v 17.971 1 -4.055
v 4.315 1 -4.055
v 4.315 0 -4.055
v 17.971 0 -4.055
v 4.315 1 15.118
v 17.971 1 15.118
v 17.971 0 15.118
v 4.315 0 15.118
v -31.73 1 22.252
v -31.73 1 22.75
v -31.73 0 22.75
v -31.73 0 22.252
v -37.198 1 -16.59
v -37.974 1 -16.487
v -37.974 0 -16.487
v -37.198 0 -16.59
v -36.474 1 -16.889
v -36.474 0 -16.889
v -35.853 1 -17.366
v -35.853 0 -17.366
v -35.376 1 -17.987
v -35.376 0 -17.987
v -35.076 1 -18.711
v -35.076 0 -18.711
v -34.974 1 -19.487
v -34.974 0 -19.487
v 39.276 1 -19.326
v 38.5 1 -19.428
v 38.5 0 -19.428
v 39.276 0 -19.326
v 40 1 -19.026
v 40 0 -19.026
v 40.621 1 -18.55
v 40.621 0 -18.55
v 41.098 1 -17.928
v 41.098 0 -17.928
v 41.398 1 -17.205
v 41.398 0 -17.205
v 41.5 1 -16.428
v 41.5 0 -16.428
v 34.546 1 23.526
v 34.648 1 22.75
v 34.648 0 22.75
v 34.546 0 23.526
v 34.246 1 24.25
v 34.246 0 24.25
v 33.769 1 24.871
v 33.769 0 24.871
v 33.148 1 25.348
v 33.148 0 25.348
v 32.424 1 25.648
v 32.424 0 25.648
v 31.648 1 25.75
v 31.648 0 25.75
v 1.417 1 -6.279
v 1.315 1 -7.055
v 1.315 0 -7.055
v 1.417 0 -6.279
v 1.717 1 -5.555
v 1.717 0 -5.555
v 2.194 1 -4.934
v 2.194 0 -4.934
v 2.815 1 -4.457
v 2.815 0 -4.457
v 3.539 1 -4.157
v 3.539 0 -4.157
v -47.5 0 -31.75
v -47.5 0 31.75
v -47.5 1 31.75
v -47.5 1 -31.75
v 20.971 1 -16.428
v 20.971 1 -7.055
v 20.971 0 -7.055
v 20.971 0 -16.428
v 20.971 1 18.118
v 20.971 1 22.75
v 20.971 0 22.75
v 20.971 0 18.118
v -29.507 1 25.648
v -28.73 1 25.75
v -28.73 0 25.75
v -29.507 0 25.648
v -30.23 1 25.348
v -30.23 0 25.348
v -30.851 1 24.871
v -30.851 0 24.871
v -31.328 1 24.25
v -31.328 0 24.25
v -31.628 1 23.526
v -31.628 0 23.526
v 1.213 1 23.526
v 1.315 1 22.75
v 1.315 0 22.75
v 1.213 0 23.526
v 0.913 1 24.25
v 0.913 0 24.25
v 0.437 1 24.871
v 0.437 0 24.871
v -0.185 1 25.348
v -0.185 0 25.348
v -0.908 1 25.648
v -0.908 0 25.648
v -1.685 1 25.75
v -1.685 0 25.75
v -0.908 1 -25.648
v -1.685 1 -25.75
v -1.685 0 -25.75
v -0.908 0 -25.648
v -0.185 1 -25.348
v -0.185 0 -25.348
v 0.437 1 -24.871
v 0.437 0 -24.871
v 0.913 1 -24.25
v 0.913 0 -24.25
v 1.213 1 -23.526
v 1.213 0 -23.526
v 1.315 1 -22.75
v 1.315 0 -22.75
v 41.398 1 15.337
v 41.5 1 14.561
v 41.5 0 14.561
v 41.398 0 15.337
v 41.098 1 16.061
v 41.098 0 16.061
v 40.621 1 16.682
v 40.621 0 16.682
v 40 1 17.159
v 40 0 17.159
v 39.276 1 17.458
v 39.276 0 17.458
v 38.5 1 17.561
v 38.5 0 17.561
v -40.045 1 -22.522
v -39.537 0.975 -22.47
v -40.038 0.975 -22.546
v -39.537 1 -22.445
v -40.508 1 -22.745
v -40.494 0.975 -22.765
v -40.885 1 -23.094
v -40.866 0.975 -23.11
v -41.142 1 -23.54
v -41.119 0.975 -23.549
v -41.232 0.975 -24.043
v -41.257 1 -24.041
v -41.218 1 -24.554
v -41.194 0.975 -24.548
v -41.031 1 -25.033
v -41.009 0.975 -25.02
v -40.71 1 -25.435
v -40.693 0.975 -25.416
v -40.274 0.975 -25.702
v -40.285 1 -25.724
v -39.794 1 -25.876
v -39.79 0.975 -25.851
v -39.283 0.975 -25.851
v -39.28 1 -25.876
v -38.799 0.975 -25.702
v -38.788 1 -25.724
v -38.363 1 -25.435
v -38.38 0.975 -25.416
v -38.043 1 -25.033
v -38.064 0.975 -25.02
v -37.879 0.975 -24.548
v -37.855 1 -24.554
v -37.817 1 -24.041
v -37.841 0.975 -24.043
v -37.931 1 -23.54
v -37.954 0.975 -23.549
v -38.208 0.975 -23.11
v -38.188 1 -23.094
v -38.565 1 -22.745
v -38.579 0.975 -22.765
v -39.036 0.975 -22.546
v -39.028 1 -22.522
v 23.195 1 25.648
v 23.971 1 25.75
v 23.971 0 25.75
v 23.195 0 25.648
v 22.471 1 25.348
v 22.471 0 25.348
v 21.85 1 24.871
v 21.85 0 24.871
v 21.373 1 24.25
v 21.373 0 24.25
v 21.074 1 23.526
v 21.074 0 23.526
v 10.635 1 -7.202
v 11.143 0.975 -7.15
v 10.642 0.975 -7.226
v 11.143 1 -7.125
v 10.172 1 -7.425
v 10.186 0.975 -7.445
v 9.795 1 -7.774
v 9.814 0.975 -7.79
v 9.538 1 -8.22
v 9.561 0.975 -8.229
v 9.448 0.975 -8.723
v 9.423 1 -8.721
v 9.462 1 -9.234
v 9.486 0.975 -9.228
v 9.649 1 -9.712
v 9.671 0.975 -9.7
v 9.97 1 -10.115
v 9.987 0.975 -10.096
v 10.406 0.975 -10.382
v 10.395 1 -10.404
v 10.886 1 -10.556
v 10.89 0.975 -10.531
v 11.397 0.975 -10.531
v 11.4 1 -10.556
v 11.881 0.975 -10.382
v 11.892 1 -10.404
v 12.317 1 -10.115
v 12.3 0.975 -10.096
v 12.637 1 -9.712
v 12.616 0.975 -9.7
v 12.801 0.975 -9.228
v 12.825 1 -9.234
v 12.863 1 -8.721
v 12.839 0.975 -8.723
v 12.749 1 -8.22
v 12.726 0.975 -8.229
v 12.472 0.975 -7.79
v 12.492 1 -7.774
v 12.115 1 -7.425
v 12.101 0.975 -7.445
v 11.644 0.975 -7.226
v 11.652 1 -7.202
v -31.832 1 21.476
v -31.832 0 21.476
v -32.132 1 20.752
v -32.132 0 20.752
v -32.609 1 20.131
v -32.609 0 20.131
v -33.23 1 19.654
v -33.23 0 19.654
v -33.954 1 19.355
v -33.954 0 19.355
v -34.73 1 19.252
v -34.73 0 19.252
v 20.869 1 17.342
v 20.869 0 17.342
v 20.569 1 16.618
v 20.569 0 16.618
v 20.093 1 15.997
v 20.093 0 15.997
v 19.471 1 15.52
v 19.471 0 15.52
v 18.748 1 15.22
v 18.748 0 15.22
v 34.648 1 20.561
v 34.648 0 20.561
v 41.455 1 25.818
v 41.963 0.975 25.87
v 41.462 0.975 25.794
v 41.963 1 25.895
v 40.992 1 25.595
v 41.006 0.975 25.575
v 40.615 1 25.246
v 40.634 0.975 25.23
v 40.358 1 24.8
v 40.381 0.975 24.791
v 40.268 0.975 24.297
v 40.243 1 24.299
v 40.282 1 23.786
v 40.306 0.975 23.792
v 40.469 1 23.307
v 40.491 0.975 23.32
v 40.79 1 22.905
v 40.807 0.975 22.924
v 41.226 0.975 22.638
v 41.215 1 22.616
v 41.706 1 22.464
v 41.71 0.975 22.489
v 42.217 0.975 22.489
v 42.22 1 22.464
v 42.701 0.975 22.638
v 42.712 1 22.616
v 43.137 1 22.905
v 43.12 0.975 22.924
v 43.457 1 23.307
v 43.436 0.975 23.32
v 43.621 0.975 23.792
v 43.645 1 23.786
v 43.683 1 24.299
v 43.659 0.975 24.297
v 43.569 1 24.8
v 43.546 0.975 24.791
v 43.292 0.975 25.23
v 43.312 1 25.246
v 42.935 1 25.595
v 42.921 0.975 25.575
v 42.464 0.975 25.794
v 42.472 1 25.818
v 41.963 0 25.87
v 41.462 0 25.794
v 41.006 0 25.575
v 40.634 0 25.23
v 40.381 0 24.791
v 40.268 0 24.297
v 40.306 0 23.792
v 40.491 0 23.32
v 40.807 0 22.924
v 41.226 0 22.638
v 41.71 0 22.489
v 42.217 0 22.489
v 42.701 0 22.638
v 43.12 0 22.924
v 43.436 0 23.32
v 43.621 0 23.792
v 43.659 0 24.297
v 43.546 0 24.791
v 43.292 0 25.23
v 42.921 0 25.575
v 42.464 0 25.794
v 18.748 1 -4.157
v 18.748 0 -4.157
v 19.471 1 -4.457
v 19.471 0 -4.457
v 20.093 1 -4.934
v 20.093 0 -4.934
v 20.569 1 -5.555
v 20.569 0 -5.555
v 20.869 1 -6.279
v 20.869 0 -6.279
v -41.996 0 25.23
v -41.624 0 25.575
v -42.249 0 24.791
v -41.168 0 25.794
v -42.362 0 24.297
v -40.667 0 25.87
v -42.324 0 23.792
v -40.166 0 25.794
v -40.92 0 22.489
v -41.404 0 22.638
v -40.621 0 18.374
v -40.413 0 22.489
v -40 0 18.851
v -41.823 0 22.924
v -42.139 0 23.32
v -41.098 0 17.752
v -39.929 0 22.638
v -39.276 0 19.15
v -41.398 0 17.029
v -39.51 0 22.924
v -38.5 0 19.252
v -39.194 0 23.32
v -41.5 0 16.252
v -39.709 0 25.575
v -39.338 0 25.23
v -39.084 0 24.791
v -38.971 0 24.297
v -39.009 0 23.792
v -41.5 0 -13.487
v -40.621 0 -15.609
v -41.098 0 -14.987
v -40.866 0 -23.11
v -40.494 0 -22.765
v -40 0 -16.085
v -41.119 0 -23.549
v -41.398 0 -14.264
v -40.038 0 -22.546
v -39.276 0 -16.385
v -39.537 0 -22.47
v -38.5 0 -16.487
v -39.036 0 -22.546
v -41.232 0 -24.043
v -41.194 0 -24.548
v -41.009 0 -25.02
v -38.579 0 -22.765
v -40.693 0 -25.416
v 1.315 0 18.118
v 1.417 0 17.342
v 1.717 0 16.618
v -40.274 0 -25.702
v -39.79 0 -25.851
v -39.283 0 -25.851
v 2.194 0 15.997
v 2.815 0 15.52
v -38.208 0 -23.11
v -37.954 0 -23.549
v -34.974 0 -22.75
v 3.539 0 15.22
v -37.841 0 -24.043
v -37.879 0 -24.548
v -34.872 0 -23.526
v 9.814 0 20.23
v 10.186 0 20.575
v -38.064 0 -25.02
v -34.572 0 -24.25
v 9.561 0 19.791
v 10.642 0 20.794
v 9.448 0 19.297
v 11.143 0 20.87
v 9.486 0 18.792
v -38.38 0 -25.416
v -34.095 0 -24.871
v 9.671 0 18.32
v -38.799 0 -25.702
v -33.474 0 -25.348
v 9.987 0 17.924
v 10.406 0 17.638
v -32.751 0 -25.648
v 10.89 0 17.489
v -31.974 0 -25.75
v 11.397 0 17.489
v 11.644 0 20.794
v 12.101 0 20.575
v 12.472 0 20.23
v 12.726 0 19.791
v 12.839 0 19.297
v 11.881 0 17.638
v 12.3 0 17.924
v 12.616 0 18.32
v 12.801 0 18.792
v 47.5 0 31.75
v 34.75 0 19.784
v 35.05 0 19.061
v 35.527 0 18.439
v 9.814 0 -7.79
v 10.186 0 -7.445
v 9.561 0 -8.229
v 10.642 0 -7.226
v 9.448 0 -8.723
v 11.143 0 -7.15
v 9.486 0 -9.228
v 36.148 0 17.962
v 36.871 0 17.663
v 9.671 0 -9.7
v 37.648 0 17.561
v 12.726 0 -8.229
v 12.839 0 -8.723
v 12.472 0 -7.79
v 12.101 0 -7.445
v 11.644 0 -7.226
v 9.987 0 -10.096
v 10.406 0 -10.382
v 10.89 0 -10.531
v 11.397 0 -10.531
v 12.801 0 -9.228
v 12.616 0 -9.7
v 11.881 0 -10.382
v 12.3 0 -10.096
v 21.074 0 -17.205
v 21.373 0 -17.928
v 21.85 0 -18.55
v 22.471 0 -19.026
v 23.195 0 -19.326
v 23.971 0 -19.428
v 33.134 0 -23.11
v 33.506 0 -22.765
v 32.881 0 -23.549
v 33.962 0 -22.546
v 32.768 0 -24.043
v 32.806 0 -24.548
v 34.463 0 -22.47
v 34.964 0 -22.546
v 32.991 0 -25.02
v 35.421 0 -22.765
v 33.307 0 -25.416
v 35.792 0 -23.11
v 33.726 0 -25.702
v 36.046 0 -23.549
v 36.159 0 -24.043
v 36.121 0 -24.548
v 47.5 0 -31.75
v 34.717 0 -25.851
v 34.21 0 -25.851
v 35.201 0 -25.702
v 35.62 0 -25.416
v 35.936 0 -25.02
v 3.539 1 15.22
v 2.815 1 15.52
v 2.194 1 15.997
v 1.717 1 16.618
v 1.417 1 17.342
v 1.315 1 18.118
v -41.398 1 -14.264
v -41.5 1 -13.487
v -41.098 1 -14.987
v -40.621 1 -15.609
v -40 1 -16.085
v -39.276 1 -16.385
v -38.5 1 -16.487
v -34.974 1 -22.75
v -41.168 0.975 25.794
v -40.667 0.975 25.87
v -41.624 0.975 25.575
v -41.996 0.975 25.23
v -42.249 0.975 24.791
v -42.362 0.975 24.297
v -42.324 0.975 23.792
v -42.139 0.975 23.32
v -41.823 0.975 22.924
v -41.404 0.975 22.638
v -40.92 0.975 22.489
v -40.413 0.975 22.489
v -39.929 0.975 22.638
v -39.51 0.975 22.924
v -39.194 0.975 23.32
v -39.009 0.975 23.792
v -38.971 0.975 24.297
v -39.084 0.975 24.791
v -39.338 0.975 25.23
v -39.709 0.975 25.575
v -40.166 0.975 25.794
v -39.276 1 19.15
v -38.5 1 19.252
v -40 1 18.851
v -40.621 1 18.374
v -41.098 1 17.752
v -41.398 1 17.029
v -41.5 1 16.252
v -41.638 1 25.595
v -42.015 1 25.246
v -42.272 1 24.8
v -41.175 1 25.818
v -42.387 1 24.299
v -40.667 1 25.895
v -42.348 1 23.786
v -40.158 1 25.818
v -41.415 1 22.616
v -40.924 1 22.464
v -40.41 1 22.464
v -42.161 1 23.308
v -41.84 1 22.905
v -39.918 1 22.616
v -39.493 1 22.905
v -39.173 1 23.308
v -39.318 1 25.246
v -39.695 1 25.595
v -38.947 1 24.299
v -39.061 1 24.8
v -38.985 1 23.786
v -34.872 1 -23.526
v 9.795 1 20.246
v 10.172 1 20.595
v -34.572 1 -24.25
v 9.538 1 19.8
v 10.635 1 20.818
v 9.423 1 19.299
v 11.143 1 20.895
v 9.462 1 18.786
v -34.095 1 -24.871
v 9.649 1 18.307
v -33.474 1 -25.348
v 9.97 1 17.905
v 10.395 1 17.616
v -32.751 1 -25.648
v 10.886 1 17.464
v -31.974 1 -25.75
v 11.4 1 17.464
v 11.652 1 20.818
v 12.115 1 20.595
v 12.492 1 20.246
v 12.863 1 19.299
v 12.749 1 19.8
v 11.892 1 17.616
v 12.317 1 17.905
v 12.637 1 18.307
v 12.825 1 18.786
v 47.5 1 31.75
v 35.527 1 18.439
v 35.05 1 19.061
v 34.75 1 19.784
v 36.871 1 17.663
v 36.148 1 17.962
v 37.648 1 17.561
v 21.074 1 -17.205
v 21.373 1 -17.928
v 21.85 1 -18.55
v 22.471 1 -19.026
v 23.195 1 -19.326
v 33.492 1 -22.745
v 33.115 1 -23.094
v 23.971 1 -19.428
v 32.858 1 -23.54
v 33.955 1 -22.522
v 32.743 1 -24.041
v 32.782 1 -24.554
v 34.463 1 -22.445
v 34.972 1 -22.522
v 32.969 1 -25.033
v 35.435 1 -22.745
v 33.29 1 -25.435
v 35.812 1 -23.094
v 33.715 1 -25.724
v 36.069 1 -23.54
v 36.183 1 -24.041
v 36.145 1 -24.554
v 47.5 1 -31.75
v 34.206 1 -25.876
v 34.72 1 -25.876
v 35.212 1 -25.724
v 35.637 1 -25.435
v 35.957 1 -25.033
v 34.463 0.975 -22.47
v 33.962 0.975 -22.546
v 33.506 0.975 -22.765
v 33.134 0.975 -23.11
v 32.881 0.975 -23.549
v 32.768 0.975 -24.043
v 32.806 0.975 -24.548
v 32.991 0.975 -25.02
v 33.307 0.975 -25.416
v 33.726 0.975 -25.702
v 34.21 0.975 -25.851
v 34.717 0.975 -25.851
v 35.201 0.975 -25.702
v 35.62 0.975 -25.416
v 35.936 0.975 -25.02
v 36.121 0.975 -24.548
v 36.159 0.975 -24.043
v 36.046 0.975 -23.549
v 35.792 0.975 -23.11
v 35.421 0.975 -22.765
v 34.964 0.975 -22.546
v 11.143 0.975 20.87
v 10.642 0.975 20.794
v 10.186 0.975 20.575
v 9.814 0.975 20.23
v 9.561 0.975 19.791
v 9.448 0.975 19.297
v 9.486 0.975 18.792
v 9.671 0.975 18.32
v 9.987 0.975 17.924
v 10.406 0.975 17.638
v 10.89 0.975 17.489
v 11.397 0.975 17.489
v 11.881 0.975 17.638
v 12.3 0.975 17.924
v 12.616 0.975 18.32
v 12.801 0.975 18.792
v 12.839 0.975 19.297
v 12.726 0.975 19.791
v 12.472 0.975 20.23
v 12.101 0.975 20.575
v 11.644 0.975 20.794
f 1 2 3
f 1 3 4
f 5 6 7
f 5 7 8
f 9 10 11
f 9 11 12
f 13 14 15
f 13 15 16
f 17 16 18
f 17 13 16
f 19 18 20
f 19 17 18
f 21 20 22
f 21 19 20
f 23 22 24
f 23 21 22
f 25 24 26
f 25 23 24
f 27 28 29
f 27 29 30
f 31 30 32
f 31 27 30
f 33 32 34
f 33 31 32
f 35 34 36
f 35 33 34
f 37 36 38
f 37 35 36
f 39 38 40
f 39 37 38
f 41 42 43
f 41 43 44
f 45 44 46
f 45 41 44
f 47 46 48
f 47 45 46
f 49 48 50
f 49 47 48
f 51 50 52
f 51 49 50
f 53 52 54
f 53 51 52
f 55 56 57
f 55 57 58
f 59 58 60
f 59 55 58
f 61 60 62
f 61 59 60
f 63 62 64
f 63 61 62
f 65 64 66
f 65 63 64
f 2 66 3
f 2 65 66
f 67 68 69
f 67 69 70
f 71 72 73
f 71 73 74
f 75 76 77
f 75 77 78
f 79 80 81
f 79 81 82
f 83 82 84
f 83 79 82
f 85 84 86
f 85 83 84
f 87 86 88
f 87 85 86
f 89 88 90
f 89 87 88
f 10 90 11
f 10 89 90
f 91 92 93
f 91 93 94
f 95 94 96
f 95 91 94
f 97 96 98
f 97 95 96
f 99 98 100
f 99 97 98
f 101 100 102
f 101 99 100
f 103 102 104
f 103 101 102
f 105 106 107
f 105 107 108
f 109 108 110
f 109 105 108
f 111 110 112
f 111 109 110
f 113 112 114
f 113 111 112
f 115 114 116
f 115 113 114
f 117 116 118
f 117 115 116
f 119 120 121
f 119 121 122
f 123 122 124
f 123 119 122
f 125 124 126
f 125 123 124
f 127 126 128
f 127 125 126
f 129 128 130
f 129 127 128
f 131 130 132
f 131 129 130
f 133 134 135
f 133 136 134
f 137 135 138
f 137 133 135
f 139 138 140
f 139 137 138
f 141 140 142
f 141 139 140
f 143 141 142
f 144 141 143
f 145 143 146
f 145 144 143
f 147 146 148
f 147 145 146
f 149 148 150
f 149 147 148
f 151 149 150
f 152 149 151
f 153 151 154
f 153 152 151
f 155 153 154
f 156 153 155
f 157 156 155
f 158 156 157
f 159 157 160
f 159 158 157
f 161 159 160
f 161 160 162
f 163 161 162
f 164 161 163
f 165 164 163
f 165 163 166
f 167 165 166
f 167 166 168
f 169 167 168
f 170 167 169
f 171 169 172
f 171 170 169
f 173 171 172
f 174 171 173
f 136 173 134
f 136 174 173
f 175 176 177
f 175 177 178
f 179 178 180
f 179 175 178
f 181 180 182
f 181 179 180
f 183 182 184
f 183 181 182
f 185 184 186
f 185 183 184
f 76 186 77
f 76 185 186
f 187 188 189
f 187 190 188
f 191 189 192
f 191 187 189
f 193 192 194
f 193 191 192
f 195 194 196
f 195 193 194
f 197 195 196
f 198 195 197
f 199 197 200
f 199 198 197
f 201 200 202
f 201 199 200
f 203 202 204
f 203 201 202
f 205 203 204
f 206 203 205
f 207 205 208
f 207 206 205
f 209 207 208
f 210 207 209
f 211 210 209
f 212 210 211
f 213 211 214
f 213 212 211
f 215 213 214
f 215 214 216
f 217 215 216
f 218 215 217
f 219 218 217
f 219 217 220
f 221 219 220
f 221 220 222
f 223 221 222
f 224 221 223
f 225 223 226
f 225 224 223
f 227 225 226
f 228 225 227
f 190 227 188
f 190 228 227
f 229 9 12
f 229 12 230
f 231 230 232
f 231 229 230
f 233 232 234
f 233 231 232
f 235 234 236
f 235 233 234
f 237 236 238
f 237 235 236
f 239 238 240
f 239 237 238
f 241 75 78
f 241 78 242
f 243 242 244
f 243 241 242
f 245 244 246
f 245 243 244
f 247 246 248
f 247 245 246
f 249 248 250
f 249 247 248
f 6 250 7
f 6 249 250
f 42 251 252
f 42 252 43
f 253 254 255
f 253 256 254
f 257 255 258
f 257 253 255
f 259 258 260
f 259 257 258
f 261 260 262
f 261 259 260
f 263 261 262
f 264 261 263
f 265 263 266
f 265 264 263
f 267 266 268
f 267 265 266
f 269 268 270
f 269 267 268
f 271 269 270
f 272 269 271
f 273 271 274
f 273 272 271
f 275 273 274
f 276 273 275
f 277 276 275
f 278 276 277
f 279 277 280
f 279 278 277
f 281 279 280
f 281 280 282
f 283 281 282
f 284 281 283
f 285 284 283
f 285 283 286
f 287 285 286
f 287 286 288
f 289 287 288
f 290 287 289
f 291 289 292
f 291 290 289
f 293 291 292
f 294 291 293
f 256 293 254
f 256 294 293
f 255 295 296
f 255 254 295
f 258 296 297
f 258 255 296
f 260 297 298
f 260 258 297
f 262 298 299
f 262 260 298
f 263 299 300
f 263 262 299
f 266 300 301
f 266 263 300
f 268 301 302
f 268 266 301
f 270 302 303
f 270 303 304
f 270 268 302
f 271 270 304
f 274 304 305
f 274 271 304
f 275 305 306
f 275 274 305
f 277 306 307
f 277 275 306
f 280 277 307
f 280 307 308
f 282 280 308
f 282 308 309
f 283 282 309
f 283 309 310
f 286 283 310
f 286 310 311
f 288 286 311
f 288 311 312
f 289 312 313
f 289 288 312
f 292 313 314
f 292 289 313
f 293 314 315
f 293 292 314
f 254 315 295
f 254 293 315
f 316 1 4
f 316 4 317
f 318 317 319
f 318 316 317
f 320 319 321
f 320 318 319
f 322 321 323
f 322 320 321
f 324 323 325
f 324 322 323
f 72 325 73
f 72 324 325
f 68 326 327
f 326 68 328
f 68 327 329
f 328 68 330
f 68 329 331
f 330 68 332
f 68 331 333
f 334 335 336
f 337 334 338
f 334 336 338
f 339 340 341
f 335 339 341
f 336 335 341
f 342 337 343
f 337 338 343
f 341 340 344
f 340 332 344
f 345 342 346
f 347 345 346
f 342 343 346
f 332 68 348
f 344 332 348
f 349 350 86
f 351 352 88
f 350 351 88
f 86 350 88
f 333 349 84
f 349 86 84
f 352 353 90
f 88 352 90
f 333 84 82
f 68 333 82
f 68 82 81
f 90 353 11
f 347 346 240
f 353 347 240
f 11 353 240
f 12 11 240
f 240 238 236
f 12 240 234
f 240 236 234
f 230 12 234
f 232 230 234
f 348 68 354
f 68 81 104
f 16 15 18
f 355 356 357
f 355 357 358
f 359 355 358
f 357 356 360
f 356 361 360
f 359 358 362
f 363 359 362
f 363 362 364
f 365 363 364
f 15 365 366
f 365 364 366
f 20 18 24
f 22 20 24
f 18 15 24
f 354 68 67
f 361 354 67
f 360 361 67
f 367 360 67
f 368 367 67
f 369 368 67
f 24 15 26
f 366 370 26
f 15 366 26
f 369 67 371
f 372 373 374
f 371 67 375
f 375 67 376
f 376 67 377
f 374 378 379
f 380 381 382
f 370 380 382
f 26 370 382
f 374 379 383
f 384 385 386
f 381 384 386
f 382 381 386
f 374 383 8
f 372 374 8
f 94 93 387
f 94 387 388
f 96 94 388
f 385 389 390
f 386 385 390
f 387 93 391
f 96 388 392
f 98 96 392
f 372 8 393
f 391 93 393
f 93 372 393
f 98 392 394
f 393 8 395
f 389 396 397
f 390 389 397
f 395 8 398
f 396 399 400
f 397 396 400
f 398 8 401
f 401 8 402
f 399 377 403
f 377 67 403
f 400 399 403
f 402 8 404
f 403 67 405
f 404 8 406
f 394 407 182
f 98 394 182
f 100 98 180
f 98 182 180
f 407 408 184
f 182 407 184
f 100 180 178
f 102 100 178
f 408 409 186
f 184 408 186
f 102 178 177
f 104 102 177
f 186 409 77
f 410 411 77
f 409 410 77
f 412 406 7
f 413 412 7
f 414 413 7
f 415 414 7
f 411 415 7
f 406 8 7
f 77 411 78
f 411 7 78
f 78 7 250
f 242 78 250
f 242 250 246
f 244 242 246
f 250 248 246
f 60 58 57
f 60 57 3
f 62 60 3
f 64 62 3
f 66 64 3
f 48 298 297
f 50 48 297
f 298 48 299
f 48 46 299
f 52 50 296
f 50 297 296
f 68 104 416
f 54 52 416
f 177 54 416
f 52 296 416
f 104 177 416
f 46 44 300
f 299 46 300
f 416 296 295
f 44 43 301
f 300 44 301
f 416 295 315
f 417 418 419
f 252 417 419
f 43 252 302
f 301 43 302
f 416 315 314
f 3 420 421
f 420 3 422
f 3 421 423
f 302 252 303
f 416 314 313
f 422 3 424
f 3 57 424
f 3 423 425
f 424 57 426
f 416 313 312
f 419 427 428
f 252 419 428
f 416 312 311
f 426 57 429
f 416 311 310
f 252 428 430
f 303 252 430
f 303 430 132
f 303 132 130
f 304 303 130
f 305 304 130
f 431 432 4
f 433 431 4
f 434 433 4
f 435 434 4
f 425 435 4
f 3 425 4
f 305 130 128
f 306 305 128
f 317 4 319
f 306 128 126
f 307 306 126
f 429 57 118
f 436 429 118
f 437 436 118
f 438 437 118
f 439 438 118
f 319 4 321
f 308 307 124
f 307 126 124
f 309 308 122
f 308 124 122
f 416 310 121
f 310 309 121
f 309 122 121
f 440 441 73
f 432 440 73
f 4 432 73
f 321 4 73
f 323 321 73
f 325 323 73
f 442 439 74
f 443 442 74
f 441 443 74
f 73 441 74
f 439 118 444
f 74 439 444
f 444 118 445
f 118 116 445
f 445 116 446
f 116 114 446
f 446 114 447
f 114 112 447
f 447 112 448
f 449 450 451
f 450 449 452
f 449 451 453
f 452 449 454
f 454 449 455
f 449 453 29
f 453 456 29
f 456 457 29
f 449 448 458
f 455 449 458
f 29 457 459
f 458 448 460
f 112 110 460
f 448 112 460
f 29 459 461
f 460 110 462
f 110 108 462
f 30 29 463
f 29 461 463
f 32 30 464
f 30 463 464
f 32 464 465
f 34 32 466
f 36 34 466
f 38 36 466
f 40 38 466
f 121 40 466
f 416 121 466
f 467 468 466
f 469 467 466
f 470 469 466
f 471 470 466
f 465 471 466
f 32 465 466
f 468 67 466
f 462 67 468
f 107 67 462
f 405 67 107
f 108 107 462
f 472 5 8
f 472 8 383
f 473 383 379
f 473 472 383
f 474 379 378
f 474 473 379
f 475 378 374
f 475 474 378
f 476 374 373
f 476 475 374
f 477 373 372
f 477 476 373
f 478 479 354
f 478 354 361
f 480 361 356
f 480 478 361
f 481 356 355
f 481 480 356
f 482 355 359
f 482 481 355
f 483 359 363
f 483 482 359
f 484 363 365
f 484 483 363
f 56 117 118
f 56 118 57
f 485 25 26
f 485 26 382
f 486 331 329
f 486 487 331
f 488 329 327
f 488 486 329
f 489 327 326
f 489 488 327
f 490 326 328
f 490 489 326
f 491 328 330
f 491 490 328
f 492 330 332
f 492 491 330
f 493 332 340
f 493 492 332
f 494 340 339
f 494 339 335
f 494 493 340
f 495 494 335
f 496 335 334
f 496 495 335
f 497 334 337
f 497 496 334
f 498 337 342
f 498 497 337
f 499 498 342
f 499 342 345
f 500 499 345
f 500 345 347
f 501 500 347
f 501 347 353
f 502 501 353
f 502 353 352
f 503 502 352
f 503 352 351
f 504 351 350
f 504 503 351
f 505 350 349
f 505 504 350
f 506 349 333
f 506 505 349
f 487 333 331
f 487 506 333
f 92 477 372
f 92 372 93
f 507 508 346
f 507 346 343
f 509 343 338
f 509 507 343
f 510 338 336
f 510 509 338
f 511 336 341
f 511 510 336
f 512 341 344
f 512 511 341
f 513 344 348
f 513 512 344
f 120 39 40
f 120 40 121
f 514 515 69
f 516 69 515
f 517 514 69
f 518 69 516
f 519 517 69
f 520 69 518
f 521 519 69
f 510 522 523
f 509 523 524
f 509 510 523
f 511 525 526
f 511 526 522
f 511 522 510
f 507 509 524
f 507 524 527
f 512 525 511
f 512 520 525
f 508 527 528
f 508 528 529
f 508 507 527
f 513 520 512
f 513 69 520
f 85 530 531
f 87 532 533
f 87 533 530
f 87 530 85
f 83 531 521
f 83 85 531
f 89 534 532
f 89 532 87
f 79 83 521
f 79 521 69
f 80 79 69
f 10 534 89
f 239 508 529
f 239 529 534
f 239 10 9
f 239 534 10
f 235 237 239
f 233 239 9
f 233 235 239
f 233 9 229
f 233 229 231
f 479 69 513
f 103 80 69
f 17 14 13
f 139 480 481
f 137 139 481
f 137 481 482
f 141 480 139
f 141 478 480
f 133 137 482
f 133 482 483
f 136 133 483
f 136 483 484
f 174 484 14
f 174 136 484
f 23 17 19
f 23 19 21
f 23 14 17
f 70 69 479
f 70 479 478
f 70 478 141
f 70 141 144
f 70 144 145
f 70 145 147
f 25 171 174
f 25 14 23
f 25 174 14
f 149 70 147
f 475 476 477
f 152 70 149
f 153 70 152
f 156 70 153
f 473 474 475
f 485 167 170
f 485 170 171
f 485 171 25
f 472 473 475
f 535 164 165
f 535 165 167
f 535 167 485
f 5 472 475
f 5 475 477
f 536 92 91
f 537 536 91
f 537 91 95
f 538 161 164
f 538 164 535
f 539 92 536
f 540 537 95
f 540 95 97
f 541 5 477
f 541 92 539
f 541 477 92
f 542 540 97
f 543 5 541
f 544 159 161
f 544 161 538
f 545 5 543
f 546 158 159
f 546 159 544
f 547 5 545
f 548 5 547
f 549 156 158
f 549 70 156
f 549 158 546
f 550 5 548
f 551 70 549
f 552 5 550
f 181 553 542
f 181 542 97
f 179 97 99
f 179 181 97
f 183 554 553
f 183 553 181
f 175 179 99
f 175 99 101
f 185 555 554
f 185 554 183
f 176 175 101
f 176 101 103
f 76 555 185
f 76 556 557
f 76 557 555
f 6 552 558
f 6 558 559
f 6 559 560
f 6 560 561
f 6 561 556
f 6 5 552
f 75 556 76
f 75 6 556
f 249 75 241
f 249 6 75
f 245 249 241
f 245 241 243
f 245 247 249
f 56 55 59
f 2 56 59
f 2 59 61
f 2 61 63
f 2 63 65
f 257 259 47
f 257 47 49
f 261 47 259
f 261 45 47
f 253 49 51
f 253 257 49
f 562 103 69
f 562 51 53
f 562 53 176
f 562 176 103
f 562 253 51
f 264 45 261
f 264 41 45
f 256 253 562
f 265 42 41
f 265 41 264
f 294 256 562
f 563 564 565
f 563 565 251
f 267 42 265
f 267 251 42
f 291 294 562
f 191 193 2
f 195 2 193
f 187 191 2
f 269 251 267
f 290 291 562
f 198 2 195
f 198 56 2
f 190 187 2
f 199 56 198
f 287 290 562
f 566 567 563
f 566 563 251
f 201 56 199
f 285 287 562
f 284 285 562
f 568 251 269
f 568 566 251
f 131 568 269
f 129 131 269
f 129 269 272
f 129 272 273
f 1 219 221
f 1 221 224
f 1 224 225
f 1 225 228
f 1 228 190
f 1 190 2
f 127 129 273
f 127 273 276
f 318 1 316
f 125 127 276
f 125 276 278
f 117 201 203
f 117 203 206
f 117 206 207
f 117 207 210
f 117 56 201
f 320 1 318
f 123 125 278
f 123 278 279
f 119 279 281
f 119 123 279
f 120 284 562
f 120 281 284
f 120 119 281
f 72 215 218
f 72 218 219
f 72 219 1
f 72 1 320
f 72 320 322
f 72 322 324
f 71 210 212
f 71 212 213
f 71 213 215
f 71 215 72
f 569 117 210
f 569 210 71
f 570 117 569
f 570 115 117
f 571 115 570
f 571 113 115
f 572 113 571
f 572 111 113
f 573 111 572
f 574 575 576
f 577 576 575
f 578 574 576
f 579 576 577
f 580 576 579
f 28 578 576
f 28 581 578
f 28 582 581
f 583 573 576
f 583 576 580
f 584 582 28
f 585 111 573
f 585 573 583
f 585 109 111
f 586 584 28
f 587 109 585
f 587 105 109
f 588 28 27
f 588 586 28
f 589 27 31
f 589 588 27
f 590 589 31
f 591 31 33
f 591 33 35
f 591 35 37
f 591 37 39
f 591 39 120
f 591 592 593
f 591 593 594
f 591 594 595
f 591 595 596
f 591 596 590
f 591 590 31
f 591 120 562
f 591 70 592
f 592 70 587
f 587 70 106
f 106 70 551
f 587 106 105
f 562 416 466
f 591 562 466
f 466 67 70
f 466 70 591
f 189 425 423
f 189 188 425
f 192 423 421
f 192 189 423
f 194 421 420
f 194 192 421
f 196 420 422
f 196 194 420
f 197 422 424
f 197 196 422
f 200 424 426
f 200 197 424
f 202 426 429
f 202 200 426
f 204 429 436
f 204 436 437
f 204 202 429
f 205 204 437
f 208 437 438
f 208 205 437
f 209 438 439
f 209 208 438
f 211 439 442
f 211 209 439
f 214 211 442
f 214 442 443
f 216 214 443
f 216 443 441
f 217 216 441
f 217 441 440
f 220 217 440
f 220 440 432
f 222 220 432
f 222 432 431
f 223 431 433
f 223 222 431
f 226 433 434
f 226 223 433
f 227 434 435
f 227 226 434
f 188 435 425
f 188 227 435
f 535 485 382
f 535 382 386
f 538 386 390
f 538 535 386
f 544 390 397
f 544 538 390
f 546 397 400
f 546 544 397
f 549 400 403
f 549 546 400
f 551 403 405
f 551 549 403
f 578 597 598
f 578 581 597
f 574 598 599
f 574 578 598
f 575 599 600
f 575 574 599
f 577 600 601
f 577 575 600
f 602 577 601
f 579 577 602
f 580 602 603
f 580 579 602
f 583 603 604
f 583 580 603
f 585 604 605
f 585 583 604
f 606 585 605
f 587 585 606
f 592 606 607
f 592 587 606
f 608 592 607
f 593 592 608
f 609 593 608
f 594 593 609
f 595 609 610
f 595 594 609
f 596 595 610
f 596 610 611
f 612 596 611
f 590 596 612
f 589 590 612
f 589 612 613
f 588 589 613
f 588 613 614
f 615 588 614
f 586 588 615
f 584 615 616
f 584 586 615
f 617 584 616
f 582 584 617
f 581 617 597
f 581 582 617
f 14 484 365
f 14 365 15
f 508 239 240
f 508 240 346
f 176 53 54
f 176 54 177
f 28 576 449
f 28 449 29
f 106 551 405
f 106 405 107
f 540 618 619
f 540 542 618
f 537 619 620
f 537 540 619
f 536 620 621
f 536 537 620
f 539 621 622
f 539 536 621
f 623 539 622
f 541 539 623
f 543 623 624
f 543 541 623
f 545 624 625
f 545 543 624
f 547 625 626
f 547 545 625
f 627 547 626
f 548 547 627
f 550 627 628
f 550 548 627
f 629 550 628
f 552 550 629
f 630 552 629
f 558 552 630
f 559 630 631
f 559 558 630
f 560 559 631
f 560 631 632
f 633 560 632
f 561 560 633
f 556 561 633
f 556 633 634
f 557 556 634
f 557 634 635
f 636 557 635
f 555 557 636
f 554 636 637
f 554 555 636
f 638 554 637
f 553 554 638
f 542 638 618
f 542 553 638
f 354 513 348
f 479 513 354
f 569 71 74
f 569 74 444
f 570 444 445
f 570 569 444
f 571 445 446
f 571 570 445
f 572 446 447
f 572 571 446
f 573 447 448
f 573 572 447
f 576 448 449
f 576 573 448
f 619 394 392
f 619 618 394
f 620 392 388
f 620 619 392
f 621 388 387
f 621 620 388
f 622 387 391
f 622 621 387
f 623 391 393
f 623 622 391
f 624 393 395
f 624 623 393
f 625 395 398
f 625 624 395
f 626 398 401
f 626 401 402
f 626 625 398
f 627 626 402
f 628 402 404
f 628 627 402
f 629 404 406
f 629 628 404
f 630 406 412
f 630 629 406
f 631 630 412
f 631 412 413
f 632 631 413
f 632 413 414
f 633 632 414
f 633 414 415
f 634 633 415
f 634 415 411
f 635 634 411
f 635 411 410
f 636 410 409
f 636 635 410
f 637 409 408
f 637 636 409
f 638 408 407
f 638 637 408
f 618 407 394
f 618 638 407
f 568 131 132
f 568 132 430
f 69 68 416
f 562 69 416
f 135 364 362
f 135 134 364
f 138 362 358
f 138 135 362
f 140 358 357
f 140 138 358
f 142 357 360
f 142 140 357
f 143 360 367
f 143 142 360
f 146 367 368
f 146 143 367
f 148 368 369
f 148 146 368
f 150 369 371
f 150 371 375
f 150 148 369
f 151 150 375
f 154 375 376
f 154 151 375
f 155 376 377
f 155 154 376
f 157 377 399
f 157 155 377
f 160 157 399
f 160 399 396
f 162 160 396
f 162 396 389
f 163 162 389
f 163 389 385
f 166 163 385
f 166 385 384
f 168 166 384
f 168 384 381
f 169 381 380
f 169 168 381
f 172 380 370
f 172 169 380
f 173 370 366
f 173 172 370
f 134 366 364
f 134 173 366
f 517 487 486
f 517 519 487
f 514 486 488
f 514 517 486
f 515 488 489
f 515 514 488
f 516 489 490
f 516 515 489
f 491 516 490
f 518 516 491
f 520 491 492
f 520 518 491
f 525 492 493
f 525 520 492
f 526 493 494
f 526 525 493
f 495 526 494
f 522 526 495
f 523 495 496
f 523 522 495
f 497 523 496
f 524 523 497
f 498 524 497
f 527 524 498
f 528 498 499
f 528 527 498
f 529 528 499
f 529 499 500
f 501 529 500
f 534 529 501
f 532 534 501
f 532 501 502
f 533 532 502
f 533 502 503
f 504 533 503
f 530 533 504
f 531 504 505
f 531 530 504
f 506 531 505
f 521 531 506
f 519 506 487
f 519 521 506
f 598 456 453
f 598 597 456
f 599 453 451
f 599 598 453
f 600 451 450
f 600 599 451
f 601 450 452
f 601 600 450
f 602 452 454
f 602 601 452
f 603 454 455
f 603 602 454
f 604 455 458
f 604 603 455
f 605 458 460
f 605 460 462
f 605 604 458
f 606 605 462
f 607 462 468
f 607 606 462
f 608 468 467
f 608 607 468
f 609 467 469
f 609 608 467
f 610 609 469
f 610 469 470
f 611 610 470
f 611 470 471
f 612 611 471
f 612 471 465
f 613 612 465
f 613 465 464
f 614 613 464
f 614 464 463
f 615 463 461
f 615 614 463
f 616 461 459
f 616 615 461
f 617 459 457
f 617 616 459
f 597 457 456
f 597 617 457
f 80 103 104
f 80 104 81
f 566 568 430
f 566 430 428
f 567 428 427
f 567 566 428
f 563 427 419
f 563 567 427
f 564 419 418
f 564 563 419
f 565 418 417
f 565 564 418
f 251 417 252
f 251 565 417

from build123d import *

# Parameters (mm, degrees)
SKETCH2_W                     = 95
SKETCH2_H                     = 63.5
BOSS_EXTRUDE1_DEPTH           = 1
M3_CLEARANCE_HOLE1_AT_2_COUNT = 2
M3_CLEARANCE_HOLE1_AT_2_PITCH = 48.353205685
M3_CLEARANCE_HOLE1_AT_3_COUNT = 2
M3_CLEARANCE_HOLE1_AT_3_PITCH = 74
M3_CLEARANCE_HOLE1_AT_4_COUNT = 2
M3_CLEARANCE_HOLE1_AT_4_PITCH = 94.757614997
M3_CLEARANCE_HOLE1_AT_5_COUNT = 2
M3_CLEARANCE_HOLE1_AT_5_PITCH = 66.684465957
M3_CLEARANCE_HOLE1_AT_6_COUNT = 2
M3_CLEARANCE_HOLE1_AT_6_PITCH = 52.944922325
CUT_EXTRUDE1_DEPTH            = 1


with BuildPart() as part:
    # Sketch2 → Boss-Extrude1 (new body)
    with BuildSketch(Plane(origin=(0, 0, 0), x_dir=(1, 0, 0), z_dir=(0, 1, 0))):
        Rectangle(SKETCH2_W, SKETCH2_H)
    extrude(amount=BOSS_EXTRUDE1_DEPTH)

    # Sketch8 → M3 Clearance Hole1 (revolve, cut)
    with BuildSketch(Plane(origin=(-39.536732268, 1, -24.17), x_dir=(0, 0, 1), z_dir=(1, 0, 0))):
        Polygon((0, 0), (0, 1), (1.7, 1), (1.7, 0.025), (1.725, 0), align=None)
    m3_clearance_hole1 = revolve(axis=Axis((-39.536732268, 7.35, -24.17), (0, -1, 0)), mode=Mode.SUBTRACT)

    # M3 Clearance Hole1 at 2: M3 Clearance Hole1 ×2
    with Locations(*[Vector(-0.023369701842837577, 0, 0.9997268912236866) * (i * M3_CLEARANCE_HOLE1_AT_2_PITCH) for i in range(1, M3_CLEARANCE_HOLE1_AT_2_COUNT)]):
        add(m3_clearance_hole1, mode=Mode.SUBTRACT)

    # M3 Clearance Hole1 at 3: M3 Clearance Hole1 ×2
    with Locations(*[(i * M3_CLEARANCE_HOLE1_AT_3_PITCH, 0, 0) for i in range(1, M3_CLEARANCE_HOLE1_AT_3_COUNT)]):
        add(m3_clearance_hole1, mode=Mode.SUBTRACT)

    # M3 Clearance Hole1 at 4: M3 Clearance Hole1 ×2
    with Locations(*[Vector(0.8600891865230647, 0, 0.5101436966444779) * (i * M3_CLEARANCE_HOLE1_AT_4_PITCH) for i in range(1, M3_CLEARANCE_HOLE1_AT_4_COUNT)]):
        add(m3_clearance_hole1, mode=Mode.SUBTRACT)

    # M3 Clearance Hole1 at 5: M3 Clearance Hole1 ×2
    with Locations(*[Vector(0.7599970888649028, 0, 0.6499264765470578) * (i * M3_CLEARANCE_HOLE1_AT_5_PITCH) for i in range(1, M3_CLEARANCE_HOLE1_AT_5_COUNT)]):
        add(m3_clearance_hole1, mode=Mode.SUBTRACT)

    # M3 Clearance Hole1 at 6: M3 Clearance Hole1 ×2
    with Locations(*[Vector(0.957221160679124, 0, 0.28935730429368944) * (i * M3_CLEARANCE_HOLE1_AT_6_PITCH) for i in range(1, M3_CLEARANCE_HOLE1_AT_6_COUNT)]):
        add(m3_clearance_hole1, mode=Mode.SUBTRACT)

    # Sketch9 → Cut-Extrude1 (cut)
    with BuildSketch(Plane(origin=(0, 1, 0), x_dir=(1, 0, 0), z_dir=(0, 1, 0))):
        with BuildLine():
            Line((-34.974163292, 19.487383717), (-34.974163292, 22.75))
            ThreePointArc((-34.974163292, 22.75), (-34.095483636, 24.871320344), (-31.974163292, 25.75))
            Line((-31.974163292, 25.75), (-1.684765082, 25.75))
            ThreePointArc((-1.684765082, 25.75), (0.436555262, 24.871320344), (1.315234918, 22.75))
            Line((1.315234918, 22.75), (1.315234918, 7.055031971))
            ThreePointArc((1.315234918, 7.055031971), (2.193914574, 4.933711628), (4.315234918, 4.055031971))
            Line((4.315234918, 4.055031971), (17.971300546, 4.055031971))
            ThreePointArc((17.971300546, 4.055031971), (20.09262089, 4.933711628), (20.971300546, 7.055031971))
            Line((20.971300546, 7.055031971), (20.971300546, 16.428287462))
            ThreePointArc((20.971300546, 16.428287462), (21.849980203, 18.549607805), (23.971300546, 19.428287462))
            Line((23.971300546, 19.428287462), (38.5, 19.428287462))
            ThreePointArc((38.5, 19.428287462), (40.621320344, 18.549607805), (41.5, 16.428287462))
            Line((41.5, 16.428287462), (41.5, -14.560508757))
            ThreePointArc((41.5, -14.560508757), (40.621320344, -16.681829101), (38.5, -17.560508757))
            Line((38.5, -17.560508757), (37.647901029, -17.560508757))
            ThreePointArc((37.647901029, -17.560508757), (35.526580685, -18.439188414), (34.647901029, -20.560508757))
            Line((34.647901029, -20.560508757), (34.647901029, -22.75))
            ThreePointArc((34.647901029, -22.75), (33.769221372, -24.871320344), (31.647901029, -25.75))
            Line((31.647901029, -25.75), (23.971300546, -25.75))
            ThreePointArc((23.971300546, -25.75), (21.849980203, -24.871320344), (20.971300546, -22.75))
            Line((20.971300546, -22.75), (20.971300546, -18.118028913))
            ThreePointArc((20.971300546, -18.118028913), (20.09262089, -15.996708569), (17.971300546, -15.118028913))
            Line((17.971300546, -15.118028913), (4.315234918, -15.118028913))
            ThreePointArc((4.315234918, -15.118028913), (2.193914574, -15.996708569), (1.315234918, -18.118028913))
            Line((1.315234918, -18.118028913), (1.315234918, -22.75))
            ThreePointArc((1.315234918, -22.75), (0.436555262, -24.871320344), (-1.684765082, -25.75))
            Line((-1.684765082, -25.75), (-28.730080623, -25.75))
            ThreePointArc((-28.730080623, -25.75), (-30.851400966, -24.871320344), (-31.730080623, -22.75))
            Line((-31.730080623, -22.75), (-31.730080623, -22.252488185))
            ThreePointArc((-31.730080623, -22.252488185), (-32.608760279, -20.131167841), (-34.730080623, -19.252488185))
            Line((-34.730080623, -19.252488185), (-38.5, -19.252488185))
            ThreePointArc((-38.5, -19.252488185), (-40.621320344, -18.373808528), (-41.5, -16.252488185))
            Line((-41.5, -16.252488185), (-41.5, 13.487383717))
            ThreePointArc((-41.5, 13.487383717), (-40.621320344, 15.60870406), (-38.5, 16.487383717))
            Line((-38.5, 16.487383717), (-37.974163292, 16.487383717))
            ThreePointArc((-37.974163292, 16.487383717), (-35.852842949, 17.366063373), (-34.974163292, 19.487383717))
        make_face()
    extrude(amount=-CUT_EXTRUDE1_DEPTH, mode=Mode.SUBTRACT)


solid = part.part
